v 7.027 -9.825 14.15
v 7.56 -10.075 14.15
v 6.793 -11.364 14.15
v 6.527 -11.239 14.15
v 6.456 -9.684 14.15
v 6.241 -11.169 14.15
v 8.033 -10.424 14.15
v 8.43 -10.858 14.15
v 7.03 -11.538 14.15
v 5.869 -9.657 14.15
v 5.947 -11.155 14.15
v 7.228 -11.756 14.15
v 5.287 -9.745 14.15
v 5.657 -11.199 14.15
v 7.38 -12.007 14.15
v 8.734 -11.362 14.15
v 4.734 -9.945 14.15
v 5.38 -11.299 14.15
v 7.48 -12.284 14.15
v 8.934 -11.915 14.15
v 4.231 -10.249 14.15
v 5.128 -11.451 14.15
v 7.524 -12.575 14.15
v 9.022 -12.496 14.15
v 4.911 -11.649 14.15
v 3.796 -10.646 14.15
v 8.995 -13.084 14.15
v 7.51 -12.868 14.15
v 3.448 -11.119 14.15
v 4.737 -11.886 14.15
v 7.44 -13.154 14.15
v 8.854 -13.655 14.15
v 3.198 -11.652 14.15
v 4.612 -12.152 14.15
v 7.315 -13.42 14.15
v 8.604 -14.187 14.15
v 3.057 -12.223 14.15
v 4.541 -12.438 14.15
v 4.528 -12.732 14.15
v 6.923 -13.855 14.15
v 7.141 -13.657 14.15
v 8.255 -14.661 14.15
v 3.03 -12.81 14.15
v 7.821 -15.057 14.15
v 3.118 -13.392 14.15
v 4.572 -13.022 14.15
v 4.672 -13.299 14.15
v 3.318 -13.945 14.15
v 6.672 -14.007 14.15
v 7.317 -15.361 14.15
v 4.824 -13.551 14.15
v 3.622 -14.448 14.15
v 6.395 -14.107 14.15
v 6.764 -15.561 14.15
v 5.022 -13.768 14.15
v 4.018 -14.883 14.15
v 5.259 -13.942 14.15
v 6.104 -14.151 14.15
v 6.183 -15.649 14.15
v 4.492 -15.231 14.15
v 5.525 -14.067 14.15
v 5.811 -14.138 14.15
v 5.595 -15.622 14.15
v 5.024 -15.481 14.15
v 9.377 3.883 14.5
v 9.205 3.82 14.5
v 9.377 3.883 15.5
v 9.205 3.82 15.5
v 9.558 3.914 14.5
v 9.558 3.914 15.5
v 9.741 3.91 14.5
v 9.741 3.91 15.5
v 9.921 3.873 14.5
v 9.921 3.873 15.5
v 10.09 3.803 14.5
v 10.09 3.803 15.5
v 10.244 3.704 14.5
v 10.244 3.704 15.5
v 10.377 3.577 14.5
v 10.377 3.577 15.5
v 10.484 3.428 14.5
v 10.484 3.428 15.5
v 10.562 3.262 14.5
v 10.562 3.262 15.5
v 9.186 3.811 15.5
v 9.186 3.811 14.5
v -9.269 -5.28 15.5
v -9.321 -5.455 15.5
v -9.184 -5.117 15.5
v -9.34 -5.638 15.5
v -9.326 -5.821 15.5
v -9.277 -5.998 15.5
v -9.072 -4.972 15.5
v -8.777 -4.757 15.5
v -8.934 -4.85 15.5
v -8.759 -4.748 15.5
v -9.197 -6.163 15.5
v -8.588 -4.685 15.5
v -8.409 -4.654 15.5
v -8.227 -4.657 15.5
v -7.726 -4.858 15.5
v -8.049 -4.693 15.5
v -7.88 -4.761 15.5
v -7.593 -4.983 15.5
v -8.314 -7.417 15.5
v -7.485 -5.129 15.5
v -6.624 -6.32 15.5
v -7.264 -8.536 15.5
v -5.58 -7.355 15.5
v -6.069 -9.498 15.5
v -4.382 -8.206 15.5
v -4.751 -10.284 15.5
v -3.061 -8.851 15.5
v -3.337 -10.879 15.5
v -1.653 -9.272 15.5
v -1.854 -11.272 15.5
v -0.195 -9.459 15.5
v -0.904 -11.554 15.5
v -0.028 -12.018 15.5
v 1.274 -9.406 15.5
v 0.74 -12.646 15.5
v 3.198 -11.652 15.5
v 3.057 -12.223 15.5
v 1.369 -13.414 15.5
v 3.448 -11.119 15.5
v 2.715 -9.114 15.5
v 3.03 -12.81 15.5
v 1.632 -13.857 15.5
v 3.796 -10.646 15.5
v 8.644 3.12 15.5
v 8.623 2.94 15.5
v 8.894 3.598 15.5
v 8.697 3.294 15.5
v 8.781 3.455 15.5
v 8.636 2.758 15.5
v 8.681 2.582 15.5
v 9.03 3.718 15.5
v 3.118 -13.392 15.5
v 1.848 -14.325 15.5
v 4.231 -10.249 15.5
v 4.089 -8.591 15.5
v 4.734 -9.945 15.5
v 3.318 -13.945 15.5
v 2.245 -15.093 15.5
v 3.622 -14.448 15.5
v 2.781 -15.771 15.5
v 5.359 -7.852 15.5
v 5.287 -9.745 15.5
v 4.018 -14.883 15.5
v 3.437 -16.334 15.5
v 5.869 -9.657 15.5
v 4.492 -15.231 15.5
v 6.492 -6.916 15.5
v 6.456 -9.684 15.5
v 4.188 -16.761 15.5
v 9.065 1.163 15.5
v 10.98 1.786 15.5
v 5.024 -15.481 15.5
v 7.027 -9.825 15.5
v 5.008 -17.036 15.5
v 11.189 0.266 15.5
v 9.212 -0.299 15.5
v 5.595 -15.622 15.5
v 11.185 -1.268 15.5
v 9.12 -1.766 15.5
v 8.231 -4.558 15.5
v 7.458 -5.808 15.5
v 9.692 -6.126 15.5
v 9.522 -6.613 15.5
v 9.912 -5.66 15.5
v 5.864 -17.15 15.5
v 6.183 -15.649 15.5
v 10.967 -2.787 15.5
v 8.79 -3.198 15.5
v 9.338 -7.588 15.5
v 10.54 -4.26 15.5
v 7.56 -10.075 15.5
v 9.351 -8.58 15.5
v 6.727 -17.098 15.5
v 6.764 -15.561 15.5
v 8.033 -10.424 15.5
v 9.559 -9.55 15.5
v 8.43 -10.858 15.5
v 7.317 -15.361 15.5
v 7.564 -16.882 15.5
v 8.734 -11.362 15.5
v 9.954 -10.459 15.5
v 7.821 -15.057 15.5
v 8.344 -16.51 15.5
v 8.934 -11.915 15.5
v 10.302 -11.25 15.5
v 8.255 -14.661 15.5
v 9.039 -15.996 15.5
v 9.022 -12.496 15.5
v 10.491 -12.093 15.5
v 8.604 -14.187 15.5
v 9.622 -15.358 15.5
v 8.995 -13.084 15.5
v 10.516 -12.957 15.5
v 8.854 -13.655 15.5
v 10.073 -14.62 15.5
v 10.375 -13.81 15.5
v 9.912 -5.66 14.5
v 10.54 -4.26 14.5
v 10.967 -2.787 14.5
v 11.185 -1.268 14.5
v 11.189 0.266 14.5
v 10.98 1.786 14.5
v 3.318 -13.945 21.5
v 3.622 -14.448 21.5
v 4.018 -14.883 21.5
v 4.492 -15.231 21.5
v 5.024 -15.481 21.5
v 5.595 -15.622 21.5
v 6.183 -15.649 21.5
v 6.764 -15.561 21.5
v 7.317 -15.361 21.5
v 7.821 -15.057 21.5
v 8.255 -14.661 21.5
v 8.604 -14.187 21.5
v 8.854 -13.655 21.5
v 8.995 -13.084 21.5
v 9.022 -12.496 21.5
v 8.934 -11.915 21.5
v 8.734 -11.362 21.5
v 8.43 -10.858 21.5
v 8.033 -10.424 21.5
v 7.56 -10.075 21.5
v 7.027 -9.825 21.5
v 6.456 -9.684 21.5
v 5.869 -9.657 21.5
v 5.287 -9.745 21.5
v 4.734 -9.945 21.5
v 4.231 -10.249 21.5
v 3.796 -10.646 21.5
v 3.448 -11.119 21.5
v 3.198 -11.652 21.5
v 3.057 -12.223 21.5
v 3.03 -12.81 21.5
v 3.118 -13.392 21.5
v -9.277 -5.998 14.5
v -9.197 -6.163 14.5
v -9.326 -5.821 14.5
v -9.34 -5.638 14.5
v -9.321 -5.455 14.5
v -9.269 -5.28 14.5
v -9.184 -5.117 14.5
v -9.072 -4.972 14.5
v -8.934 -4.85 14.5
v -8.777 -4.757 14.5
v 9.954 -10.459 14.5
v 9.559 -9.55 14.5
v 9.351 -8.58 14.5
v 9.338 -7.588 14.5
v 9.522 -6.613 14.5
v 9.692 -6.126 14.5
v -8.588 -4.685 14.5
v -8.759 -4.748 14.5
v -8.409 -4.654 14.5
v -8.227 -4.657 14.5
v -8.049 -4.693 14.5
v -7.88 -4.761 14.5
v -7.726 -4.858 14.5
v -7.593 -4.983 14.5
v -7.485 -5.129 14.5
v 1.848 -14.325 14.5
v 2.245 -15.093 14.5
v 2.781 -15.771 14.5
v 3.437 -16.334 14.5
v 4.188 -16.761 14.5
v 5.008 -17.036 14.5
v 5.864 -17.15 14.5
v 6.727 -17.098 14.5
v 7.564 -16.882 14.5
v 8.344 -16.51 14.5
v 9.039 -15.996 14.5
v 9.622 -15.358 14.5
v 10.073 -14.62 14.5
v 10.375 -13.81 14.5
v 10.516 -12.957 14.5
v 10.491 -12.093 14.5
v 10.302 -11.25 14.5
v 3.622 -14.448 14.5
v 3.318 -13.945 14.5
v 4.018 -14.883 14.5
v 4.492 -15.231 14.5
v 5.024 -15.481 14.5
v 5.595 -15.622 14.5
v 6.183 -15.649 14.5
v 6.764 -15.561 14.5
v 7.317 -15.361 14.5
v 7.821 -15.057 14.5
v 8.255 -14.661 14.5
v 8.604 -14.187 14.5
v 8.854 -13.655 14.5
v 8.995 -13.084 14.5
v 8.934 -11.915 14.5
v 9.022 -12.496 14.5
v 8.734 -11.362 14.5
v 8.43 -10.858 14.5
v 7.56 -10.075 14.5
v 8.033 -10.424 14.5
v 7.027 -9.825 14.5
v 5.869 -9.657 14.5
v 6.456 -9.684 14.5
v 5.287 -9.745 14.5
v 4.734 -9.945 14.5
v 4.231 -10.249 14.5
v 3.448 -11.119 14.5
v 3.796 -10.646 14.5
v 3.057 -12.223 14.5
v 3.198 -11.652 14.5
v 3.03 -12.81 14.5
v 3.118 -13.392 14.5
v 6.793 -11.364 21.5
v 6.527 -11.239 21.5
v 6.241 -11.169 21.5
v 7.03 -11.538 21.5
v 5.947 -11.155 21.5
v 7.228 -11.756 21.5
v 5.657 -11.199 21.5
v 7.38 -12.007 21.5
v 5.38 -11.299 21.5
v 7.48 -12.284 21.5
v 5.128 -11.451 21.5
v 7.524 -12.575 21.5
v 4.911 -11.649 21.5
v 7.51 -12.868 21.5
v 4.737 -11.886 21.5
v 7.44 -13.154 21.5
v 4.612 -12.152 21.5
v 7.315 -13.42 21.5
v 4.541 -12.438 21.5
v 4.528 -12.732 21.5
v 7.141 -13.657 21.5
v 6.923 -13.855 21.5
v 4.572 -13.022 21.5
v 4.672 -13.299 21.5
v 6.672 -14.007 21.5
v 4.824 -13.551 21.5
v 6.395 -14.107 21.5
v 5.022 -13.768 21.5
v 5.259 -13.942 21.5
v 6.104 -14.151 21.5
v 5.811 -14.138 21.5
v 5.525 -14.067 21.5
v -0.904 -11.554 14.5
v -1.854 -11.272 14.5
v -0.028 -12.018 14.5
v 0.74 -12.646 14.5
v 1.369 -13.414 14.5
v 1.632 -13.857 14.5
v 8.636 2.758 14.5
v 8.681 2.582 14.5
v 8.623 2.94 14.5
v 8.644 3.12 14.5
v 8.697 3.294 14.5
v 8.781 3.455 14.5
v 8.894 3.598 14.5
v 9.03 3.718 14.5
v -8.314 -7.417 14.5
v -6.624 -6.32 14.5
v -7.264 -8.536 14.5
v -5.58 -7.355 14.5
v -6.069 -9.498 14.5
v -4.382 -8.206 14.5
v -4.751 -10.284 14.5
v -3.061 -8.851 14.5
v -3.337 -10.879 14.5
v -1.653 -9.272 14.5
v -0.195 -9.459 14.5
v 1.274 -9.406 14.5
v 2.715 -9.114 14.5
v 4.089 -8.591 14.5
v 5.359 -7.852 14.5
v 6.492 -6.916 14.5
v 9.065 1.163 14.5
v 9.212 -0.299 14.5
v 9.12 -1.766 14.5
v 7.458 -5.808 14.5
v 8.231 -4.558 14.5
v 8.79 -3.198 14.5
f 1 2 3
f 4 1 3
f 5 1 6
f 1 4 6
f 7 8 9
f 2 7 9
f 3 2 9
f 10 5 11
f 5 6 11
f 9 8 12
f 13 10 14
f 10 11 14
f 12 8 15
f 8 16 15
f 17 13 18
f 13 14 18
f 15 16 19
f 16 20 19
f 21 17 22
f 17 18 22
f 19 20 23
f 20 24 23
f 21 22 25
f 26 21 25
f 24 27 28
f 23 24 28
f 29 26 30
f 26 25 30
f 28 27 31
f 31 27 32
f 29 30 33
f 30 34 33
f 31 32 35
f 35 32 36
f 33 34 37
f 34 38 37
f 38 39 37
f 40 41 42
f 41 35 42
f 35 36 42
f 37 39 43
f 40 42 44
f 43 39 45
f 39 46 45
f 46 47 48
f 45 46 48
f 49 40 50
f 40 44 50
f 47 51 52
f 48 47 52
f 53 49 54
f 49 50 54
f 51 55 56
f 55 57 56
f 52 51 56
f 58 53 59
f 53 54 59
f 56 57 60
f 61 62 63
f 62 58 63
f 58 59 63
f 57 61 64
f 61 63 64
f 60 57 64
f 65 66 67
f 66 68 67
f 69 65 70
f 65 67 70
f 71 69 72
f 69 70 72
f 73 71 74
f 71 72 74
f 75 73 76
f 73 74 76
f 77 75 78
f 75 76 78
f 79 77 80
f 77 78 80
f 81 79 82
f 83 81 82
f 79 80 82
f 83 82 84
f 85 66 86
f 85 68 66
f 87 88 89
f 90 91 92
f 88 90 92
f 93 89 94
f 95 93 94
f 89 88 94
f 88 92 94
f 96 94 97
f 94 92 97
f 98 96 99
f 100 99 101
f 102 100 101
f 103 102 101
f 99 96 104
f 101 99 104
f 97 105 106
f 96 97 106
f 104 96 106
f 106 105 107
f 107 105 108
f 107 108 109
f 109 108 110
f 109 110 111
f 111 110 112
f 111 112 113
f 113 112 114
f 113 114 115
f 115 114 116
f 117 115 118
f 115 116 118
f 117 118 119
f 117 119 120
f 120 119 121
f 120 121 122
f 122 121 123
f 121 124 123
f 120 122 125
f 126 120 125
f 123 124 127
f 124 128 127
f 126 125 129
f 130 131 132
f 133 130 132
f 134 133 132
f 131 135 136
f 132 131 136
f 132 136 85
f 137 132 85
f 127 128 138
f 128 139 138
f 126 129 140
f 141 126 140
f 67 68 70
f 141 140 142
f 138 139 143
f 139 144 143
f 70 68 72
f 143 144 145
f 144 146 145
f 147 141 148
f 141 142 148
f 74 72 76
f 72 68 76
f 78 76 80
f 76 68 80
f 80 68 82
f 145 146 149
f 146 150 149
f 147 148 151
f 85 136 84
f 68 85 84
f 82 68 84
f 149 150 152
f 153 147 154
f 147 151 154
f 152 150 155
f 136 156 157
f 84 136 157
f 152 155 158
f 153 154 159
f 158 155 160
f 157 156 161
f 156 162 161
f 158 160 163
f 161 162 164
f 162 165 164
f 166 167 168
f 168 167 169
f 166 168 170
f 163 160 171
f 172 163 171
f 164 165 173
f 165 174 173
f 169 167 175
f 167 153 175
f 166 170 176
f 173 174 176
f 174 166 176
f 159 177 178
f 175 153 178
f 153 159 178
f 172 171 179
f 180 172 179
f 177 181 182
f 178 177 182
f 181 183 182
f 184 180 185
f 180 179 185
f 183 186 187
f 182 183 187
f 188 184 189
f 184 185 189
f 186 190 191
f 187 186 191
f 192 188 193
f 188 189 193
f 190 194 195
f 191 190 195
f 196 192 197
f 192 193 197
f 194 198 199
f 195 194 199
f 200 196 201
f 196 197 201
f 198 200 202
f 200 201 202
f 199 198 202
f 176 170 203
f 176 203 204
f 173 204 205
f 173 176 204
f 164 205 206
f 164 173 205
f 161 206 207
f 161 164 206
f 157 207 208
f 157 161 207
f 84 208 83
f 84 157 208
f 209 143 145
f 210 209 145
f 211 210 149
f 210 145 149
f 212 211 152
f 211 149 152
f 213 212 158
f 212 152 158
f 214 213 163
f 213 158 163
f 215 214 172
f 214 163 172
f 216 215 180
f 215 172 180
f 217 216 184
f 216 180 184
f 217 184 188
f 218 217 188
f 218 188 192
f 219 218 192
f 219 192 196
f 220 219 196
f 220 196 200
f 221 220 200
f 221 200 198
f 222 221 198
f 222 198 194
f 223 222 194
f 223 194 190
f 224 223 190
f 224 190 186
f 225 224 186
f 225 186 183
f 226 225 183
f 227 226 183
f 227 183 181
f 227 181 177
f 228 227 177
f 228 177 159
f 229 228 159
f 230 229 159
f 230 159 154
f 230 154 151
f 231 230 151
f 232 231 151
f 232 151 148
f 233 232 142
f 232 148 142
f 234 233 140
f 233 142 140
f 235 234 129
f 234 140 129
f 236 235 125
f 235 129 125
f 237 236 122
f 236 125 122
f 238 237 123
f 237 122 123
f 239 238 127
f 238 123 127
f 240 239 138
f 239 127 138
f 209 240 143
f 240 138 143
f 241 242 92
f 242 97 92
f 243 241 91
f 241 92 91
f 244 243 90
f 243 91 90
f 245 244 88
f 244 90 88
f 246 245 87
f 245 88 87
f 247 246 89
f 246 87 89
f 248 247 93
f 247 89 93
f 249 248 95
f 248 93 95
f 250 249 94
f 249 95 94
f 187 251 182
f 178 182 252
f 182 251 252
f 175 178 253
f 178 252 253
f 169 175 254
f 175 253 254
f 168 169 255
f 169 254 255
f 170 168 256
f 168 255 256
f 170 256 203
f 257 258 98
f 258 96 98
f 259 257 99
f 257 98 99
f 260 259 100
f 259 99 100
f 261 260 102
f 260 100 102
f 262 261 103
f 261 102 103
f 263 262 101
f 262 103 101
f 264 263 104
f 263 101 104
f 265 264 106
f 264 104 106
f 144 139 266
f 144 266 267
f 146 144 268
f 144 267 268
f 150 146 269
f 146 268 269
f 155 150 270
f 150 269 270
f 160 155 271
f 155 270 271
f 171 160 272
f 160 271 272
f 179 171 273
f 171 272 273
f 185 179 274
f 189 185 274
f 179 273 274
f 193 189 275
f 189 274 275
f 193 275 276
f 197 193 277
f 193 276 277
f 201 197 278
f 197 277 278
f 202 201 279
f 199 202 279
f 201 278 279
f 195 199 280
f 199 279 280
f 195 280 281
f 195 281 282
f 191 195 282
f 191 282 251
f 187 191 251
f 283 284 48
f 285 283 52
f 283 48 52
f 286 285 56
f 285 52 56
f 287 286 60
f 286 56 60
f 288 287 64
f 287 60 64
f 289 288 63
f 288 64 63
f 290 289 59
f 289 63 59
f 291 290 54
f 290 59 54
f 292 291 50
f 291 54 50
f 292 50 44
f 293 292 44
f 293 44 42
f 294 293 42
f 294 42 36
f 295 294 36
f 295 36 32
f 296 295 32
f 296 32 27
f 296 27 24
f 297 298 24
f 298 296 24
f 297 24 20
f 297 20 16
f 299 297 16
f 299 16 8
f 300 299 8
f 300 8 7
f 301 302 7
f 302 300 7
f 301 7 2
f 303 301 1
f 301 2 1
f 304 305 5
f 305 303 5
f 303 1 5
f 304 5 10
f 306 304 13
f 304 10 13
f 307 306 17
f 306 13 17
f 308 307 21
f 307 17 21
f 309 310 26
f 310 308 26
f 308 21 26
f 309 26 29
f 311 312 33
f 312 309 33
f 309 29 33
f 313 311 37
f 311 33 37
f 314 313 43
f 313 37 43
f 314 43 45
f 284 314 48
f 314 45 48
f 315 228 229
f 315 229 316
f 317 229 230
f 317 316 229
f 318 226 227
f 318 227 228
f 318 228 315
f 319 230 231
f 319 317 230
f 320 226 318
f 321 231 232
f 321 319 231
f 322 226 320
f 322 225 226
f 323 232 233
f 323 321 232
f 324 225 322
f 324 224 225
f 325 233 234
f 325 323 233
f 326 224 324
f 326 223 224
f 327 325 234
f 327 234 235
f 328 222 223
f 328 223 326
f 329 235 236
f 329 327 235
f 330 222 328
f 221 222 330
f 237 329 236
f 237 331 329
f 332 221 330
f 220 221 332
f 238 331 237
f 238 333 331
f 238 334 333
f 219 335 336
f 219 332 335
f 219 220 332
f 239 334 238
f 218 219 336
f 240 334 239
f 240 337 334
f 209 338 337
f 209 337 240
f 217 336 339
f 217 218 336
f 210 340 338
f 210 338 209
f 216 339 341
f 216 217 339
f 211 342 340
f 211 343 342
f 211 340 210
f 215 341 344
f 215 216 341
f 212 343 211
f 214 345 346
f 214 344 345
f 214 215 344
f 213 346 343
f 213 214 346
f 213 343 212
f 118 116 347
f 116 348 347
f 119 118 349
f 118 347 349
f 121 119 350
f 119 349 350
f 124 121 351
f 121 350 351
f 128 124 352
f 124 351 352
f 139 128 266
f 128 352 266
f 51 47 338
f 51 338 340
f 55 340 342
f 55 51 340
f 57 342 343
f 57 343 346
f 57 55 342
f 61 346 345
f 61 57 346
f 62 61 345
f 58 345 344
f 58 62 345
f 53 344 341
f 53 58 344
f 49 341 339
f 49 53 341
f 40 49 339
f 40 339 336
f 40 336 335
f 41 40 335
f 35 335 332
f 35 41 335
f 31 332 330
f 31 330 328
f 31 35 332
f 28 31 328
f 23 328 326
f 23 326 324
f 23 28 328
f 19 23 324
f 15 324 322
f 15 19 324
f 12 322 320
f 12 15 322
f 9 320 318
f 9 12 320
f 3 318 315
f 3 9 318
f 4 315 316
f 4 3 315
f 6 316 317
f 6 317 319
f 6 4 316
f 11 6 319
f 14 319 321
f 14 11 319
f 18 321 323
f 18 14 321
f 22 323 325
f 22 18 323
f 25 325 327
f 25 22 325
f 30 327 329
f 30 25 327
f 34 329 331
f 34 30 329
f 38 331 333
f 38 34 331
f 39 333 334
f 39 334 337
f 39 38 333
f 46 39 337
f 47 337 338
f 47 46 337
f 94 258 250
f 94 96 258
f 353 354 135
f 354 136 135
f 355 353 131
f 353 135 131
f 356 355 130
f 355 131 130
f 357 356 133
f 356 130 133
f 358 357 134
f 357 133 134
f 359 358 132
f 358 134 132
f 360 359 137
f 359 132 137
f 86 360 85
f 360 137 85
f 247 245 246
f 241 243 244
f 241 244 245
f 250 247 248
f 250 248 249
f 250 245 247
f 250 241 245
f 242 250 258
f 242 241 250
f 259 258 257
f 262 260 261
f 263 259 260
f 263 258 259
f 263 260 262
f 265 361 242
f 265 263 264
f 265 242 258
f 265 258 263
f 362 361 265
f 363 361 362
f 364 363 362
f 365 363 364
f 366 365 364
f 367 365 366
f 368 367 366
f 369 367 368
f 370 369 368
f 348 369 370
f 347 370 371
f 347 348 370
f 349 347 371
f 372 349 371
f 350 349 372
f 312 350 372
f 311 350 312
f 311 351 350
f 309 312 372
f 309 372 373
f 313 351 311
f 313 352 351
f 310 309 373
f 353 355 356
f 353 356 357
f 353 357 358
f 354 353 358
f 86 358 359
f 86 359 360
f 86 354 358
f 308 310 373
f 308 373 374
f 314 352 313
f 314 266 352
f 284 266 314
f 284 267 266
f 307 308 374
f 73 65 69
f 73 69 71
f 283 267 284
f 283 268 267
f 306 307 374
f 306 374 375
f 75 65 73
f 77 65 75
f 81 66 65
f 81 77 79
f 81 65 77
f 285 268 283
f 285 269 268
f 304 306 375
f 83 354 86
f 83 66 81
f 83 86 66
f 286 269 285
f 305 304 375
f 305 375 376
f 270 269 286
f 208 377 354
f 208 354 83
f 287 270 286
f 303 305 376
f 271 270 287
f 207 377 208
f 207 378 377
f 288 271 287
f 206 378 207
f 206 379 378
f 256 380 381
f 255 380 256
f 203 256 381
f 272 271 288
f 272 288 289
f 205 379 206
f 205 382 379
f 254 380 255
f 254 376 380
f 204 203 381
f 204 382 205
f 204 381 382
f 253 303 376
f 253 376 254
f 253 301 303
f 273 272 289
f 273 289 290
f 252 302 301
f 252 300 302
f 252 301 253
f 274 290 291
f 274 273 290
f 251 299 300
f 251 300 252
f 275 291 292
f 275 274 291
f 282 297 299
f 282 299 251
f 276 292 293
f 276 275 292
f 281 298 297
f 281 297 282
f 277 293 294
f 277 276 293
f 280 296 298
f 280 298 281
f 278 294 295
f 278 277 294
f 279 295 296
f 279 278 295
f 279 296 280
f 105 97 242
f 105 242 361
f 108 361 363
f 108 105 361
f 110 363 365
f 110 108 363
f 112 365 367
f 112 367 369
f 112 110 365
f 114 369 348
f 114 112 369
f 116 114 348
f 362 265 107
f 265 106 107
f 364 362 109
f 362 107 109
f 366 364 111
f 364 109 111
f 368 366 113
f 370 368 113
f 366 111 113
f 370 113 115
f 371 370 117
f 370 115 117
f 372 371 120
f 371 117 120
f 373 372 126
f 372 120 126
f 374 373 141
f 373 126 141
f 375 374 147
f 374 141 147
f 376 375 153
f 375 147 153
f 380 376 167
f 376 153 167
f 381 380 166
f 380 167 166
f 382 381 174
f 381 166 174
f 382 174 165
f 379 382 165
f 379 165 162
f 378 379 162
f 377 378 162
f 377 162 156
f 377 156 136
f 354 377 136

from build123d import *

# Parameters (mm, degrees)
CYLINDER907_R             = 1.5
CYLINDER907_DEPTH         = 7.35
CYLINDER903_W             = 9
CYLINDER903_H             = 1
CYLINDER903_ANGLE         = 180
CYLINDER904_W             = 11
CYLINDER904_H             = 1
CYLINDER904_ANGLE         = 180
CYLINDER906_R             = 3
CYLINDER906_DEPTH         = 7.35
CYLINDER905_R             = 4.5
CYLINDER905_DEPTH         = 1
FILLET015_R               = 5
FILLET016_R               = 0.99
FILLET016_PLACEMENT_ANGLE = 205.5


with BuildPart() as cylinder1030:
    # Cylinder907 → Cylinder907 (new body)
    with BuildSketch(Plane(origin=(0, 13.5, -0.35), x_dir=(1, 0, 0), z_dir=(0, 0, 1))):
        Circle(CYLINDER907_R)
    extrude(amount=CYLINDER907_DEPTH)


with BuildPart() as cylinder1026:
    # Cylinder903 → Cylinder903 (revolve)
    with BuildSketch(Plane.XZ):
        with Locations((4.5, 0.5)):
            Rectangle(CYLINDER903_W, CYLINDER903_H)
    revolve(axis=Axis((0, 0, 0), (0, 0, 1)), revolution_arc=CYLINDER903_ANGLE)


with BuildPart() as cut014023:
    # Cylinder904 → Cylinder904 (revolve)
    with BuildSketch(Plane.XZ):
        with Locations((5.5, 0.5)):
            Rectangle(CYLINDER904_W, CYLINDER904_H)
    revolve(axis=Axis((0, 0, 0), (0, 0, 1)), revolution_arc=CYLINDER904_ANGLE)

    # Cut014023: cut Cylinder1026
    add(cylinder1026.part, mode=Mode.SUBTRACT)


with BuildPart() as cylinder1029:
    # Cylinder906 → Cylinder906 (new body)
    with BuildSketch(Plane(origin=(0, 13.5, -0.35), x_dir=(1, 0, 0), z_dir=(0, 0, 1))):
        Circle(CYLINDER906_R)
    extrude(amount=CYLINDER906_DEPTH)


with BuildPart() as selector:
    # Cylinder905 → Cylinder905 (new body)
    with BuildSketch(Plane(origin=(0, 13.5, 0), x_dir=(1, 0, 0), z_dir=(0, 0, 1))):
        Circle(CYLINDER905_R)
    extrude(amount=CYLINDER905_DEPTH)

    # Fusion060: union Cut014023, Cylinder1029
    add(cut014023.part)
    add(cylinder1029.part)

    # Cut014024: cut Cylinder1030
    add(cylinder1030.part, mode=Mode.SUBTRACT)

    # Fillet015
    fillet015_edges = [selector.edges().sort_by_distance(p)[0] for p in [
        (-3.337446, 10.481481, 0.5),
        (3.337446, 10.481481, 0.5),
    ]]
    fillet(fillet015_edges, radius=FILLET015_R)

    # Fillet016
    fillet016_edges = [selector.edges().sort_by_distance(p)[0] for p in [
        (-11, 0, 0.5),
        (-9, 0, 0.5),
        (11, 0, 0.5),
        (9, 0, 0.5),
    ]]
    fillet(fillet016_edges, radius=FILLET016_R)


with BuildPart() as selector_1:
    # Fillet016 placement: moved
    add(selector.part.moved(Location((0.213923, -0.468228, 14.5))).rotate(Axis((0.213923, -0.468228, 14.5), (0, 0, 1)), FILLET016_PLACEMENT_ANGLE))


solid = selector_1.part
